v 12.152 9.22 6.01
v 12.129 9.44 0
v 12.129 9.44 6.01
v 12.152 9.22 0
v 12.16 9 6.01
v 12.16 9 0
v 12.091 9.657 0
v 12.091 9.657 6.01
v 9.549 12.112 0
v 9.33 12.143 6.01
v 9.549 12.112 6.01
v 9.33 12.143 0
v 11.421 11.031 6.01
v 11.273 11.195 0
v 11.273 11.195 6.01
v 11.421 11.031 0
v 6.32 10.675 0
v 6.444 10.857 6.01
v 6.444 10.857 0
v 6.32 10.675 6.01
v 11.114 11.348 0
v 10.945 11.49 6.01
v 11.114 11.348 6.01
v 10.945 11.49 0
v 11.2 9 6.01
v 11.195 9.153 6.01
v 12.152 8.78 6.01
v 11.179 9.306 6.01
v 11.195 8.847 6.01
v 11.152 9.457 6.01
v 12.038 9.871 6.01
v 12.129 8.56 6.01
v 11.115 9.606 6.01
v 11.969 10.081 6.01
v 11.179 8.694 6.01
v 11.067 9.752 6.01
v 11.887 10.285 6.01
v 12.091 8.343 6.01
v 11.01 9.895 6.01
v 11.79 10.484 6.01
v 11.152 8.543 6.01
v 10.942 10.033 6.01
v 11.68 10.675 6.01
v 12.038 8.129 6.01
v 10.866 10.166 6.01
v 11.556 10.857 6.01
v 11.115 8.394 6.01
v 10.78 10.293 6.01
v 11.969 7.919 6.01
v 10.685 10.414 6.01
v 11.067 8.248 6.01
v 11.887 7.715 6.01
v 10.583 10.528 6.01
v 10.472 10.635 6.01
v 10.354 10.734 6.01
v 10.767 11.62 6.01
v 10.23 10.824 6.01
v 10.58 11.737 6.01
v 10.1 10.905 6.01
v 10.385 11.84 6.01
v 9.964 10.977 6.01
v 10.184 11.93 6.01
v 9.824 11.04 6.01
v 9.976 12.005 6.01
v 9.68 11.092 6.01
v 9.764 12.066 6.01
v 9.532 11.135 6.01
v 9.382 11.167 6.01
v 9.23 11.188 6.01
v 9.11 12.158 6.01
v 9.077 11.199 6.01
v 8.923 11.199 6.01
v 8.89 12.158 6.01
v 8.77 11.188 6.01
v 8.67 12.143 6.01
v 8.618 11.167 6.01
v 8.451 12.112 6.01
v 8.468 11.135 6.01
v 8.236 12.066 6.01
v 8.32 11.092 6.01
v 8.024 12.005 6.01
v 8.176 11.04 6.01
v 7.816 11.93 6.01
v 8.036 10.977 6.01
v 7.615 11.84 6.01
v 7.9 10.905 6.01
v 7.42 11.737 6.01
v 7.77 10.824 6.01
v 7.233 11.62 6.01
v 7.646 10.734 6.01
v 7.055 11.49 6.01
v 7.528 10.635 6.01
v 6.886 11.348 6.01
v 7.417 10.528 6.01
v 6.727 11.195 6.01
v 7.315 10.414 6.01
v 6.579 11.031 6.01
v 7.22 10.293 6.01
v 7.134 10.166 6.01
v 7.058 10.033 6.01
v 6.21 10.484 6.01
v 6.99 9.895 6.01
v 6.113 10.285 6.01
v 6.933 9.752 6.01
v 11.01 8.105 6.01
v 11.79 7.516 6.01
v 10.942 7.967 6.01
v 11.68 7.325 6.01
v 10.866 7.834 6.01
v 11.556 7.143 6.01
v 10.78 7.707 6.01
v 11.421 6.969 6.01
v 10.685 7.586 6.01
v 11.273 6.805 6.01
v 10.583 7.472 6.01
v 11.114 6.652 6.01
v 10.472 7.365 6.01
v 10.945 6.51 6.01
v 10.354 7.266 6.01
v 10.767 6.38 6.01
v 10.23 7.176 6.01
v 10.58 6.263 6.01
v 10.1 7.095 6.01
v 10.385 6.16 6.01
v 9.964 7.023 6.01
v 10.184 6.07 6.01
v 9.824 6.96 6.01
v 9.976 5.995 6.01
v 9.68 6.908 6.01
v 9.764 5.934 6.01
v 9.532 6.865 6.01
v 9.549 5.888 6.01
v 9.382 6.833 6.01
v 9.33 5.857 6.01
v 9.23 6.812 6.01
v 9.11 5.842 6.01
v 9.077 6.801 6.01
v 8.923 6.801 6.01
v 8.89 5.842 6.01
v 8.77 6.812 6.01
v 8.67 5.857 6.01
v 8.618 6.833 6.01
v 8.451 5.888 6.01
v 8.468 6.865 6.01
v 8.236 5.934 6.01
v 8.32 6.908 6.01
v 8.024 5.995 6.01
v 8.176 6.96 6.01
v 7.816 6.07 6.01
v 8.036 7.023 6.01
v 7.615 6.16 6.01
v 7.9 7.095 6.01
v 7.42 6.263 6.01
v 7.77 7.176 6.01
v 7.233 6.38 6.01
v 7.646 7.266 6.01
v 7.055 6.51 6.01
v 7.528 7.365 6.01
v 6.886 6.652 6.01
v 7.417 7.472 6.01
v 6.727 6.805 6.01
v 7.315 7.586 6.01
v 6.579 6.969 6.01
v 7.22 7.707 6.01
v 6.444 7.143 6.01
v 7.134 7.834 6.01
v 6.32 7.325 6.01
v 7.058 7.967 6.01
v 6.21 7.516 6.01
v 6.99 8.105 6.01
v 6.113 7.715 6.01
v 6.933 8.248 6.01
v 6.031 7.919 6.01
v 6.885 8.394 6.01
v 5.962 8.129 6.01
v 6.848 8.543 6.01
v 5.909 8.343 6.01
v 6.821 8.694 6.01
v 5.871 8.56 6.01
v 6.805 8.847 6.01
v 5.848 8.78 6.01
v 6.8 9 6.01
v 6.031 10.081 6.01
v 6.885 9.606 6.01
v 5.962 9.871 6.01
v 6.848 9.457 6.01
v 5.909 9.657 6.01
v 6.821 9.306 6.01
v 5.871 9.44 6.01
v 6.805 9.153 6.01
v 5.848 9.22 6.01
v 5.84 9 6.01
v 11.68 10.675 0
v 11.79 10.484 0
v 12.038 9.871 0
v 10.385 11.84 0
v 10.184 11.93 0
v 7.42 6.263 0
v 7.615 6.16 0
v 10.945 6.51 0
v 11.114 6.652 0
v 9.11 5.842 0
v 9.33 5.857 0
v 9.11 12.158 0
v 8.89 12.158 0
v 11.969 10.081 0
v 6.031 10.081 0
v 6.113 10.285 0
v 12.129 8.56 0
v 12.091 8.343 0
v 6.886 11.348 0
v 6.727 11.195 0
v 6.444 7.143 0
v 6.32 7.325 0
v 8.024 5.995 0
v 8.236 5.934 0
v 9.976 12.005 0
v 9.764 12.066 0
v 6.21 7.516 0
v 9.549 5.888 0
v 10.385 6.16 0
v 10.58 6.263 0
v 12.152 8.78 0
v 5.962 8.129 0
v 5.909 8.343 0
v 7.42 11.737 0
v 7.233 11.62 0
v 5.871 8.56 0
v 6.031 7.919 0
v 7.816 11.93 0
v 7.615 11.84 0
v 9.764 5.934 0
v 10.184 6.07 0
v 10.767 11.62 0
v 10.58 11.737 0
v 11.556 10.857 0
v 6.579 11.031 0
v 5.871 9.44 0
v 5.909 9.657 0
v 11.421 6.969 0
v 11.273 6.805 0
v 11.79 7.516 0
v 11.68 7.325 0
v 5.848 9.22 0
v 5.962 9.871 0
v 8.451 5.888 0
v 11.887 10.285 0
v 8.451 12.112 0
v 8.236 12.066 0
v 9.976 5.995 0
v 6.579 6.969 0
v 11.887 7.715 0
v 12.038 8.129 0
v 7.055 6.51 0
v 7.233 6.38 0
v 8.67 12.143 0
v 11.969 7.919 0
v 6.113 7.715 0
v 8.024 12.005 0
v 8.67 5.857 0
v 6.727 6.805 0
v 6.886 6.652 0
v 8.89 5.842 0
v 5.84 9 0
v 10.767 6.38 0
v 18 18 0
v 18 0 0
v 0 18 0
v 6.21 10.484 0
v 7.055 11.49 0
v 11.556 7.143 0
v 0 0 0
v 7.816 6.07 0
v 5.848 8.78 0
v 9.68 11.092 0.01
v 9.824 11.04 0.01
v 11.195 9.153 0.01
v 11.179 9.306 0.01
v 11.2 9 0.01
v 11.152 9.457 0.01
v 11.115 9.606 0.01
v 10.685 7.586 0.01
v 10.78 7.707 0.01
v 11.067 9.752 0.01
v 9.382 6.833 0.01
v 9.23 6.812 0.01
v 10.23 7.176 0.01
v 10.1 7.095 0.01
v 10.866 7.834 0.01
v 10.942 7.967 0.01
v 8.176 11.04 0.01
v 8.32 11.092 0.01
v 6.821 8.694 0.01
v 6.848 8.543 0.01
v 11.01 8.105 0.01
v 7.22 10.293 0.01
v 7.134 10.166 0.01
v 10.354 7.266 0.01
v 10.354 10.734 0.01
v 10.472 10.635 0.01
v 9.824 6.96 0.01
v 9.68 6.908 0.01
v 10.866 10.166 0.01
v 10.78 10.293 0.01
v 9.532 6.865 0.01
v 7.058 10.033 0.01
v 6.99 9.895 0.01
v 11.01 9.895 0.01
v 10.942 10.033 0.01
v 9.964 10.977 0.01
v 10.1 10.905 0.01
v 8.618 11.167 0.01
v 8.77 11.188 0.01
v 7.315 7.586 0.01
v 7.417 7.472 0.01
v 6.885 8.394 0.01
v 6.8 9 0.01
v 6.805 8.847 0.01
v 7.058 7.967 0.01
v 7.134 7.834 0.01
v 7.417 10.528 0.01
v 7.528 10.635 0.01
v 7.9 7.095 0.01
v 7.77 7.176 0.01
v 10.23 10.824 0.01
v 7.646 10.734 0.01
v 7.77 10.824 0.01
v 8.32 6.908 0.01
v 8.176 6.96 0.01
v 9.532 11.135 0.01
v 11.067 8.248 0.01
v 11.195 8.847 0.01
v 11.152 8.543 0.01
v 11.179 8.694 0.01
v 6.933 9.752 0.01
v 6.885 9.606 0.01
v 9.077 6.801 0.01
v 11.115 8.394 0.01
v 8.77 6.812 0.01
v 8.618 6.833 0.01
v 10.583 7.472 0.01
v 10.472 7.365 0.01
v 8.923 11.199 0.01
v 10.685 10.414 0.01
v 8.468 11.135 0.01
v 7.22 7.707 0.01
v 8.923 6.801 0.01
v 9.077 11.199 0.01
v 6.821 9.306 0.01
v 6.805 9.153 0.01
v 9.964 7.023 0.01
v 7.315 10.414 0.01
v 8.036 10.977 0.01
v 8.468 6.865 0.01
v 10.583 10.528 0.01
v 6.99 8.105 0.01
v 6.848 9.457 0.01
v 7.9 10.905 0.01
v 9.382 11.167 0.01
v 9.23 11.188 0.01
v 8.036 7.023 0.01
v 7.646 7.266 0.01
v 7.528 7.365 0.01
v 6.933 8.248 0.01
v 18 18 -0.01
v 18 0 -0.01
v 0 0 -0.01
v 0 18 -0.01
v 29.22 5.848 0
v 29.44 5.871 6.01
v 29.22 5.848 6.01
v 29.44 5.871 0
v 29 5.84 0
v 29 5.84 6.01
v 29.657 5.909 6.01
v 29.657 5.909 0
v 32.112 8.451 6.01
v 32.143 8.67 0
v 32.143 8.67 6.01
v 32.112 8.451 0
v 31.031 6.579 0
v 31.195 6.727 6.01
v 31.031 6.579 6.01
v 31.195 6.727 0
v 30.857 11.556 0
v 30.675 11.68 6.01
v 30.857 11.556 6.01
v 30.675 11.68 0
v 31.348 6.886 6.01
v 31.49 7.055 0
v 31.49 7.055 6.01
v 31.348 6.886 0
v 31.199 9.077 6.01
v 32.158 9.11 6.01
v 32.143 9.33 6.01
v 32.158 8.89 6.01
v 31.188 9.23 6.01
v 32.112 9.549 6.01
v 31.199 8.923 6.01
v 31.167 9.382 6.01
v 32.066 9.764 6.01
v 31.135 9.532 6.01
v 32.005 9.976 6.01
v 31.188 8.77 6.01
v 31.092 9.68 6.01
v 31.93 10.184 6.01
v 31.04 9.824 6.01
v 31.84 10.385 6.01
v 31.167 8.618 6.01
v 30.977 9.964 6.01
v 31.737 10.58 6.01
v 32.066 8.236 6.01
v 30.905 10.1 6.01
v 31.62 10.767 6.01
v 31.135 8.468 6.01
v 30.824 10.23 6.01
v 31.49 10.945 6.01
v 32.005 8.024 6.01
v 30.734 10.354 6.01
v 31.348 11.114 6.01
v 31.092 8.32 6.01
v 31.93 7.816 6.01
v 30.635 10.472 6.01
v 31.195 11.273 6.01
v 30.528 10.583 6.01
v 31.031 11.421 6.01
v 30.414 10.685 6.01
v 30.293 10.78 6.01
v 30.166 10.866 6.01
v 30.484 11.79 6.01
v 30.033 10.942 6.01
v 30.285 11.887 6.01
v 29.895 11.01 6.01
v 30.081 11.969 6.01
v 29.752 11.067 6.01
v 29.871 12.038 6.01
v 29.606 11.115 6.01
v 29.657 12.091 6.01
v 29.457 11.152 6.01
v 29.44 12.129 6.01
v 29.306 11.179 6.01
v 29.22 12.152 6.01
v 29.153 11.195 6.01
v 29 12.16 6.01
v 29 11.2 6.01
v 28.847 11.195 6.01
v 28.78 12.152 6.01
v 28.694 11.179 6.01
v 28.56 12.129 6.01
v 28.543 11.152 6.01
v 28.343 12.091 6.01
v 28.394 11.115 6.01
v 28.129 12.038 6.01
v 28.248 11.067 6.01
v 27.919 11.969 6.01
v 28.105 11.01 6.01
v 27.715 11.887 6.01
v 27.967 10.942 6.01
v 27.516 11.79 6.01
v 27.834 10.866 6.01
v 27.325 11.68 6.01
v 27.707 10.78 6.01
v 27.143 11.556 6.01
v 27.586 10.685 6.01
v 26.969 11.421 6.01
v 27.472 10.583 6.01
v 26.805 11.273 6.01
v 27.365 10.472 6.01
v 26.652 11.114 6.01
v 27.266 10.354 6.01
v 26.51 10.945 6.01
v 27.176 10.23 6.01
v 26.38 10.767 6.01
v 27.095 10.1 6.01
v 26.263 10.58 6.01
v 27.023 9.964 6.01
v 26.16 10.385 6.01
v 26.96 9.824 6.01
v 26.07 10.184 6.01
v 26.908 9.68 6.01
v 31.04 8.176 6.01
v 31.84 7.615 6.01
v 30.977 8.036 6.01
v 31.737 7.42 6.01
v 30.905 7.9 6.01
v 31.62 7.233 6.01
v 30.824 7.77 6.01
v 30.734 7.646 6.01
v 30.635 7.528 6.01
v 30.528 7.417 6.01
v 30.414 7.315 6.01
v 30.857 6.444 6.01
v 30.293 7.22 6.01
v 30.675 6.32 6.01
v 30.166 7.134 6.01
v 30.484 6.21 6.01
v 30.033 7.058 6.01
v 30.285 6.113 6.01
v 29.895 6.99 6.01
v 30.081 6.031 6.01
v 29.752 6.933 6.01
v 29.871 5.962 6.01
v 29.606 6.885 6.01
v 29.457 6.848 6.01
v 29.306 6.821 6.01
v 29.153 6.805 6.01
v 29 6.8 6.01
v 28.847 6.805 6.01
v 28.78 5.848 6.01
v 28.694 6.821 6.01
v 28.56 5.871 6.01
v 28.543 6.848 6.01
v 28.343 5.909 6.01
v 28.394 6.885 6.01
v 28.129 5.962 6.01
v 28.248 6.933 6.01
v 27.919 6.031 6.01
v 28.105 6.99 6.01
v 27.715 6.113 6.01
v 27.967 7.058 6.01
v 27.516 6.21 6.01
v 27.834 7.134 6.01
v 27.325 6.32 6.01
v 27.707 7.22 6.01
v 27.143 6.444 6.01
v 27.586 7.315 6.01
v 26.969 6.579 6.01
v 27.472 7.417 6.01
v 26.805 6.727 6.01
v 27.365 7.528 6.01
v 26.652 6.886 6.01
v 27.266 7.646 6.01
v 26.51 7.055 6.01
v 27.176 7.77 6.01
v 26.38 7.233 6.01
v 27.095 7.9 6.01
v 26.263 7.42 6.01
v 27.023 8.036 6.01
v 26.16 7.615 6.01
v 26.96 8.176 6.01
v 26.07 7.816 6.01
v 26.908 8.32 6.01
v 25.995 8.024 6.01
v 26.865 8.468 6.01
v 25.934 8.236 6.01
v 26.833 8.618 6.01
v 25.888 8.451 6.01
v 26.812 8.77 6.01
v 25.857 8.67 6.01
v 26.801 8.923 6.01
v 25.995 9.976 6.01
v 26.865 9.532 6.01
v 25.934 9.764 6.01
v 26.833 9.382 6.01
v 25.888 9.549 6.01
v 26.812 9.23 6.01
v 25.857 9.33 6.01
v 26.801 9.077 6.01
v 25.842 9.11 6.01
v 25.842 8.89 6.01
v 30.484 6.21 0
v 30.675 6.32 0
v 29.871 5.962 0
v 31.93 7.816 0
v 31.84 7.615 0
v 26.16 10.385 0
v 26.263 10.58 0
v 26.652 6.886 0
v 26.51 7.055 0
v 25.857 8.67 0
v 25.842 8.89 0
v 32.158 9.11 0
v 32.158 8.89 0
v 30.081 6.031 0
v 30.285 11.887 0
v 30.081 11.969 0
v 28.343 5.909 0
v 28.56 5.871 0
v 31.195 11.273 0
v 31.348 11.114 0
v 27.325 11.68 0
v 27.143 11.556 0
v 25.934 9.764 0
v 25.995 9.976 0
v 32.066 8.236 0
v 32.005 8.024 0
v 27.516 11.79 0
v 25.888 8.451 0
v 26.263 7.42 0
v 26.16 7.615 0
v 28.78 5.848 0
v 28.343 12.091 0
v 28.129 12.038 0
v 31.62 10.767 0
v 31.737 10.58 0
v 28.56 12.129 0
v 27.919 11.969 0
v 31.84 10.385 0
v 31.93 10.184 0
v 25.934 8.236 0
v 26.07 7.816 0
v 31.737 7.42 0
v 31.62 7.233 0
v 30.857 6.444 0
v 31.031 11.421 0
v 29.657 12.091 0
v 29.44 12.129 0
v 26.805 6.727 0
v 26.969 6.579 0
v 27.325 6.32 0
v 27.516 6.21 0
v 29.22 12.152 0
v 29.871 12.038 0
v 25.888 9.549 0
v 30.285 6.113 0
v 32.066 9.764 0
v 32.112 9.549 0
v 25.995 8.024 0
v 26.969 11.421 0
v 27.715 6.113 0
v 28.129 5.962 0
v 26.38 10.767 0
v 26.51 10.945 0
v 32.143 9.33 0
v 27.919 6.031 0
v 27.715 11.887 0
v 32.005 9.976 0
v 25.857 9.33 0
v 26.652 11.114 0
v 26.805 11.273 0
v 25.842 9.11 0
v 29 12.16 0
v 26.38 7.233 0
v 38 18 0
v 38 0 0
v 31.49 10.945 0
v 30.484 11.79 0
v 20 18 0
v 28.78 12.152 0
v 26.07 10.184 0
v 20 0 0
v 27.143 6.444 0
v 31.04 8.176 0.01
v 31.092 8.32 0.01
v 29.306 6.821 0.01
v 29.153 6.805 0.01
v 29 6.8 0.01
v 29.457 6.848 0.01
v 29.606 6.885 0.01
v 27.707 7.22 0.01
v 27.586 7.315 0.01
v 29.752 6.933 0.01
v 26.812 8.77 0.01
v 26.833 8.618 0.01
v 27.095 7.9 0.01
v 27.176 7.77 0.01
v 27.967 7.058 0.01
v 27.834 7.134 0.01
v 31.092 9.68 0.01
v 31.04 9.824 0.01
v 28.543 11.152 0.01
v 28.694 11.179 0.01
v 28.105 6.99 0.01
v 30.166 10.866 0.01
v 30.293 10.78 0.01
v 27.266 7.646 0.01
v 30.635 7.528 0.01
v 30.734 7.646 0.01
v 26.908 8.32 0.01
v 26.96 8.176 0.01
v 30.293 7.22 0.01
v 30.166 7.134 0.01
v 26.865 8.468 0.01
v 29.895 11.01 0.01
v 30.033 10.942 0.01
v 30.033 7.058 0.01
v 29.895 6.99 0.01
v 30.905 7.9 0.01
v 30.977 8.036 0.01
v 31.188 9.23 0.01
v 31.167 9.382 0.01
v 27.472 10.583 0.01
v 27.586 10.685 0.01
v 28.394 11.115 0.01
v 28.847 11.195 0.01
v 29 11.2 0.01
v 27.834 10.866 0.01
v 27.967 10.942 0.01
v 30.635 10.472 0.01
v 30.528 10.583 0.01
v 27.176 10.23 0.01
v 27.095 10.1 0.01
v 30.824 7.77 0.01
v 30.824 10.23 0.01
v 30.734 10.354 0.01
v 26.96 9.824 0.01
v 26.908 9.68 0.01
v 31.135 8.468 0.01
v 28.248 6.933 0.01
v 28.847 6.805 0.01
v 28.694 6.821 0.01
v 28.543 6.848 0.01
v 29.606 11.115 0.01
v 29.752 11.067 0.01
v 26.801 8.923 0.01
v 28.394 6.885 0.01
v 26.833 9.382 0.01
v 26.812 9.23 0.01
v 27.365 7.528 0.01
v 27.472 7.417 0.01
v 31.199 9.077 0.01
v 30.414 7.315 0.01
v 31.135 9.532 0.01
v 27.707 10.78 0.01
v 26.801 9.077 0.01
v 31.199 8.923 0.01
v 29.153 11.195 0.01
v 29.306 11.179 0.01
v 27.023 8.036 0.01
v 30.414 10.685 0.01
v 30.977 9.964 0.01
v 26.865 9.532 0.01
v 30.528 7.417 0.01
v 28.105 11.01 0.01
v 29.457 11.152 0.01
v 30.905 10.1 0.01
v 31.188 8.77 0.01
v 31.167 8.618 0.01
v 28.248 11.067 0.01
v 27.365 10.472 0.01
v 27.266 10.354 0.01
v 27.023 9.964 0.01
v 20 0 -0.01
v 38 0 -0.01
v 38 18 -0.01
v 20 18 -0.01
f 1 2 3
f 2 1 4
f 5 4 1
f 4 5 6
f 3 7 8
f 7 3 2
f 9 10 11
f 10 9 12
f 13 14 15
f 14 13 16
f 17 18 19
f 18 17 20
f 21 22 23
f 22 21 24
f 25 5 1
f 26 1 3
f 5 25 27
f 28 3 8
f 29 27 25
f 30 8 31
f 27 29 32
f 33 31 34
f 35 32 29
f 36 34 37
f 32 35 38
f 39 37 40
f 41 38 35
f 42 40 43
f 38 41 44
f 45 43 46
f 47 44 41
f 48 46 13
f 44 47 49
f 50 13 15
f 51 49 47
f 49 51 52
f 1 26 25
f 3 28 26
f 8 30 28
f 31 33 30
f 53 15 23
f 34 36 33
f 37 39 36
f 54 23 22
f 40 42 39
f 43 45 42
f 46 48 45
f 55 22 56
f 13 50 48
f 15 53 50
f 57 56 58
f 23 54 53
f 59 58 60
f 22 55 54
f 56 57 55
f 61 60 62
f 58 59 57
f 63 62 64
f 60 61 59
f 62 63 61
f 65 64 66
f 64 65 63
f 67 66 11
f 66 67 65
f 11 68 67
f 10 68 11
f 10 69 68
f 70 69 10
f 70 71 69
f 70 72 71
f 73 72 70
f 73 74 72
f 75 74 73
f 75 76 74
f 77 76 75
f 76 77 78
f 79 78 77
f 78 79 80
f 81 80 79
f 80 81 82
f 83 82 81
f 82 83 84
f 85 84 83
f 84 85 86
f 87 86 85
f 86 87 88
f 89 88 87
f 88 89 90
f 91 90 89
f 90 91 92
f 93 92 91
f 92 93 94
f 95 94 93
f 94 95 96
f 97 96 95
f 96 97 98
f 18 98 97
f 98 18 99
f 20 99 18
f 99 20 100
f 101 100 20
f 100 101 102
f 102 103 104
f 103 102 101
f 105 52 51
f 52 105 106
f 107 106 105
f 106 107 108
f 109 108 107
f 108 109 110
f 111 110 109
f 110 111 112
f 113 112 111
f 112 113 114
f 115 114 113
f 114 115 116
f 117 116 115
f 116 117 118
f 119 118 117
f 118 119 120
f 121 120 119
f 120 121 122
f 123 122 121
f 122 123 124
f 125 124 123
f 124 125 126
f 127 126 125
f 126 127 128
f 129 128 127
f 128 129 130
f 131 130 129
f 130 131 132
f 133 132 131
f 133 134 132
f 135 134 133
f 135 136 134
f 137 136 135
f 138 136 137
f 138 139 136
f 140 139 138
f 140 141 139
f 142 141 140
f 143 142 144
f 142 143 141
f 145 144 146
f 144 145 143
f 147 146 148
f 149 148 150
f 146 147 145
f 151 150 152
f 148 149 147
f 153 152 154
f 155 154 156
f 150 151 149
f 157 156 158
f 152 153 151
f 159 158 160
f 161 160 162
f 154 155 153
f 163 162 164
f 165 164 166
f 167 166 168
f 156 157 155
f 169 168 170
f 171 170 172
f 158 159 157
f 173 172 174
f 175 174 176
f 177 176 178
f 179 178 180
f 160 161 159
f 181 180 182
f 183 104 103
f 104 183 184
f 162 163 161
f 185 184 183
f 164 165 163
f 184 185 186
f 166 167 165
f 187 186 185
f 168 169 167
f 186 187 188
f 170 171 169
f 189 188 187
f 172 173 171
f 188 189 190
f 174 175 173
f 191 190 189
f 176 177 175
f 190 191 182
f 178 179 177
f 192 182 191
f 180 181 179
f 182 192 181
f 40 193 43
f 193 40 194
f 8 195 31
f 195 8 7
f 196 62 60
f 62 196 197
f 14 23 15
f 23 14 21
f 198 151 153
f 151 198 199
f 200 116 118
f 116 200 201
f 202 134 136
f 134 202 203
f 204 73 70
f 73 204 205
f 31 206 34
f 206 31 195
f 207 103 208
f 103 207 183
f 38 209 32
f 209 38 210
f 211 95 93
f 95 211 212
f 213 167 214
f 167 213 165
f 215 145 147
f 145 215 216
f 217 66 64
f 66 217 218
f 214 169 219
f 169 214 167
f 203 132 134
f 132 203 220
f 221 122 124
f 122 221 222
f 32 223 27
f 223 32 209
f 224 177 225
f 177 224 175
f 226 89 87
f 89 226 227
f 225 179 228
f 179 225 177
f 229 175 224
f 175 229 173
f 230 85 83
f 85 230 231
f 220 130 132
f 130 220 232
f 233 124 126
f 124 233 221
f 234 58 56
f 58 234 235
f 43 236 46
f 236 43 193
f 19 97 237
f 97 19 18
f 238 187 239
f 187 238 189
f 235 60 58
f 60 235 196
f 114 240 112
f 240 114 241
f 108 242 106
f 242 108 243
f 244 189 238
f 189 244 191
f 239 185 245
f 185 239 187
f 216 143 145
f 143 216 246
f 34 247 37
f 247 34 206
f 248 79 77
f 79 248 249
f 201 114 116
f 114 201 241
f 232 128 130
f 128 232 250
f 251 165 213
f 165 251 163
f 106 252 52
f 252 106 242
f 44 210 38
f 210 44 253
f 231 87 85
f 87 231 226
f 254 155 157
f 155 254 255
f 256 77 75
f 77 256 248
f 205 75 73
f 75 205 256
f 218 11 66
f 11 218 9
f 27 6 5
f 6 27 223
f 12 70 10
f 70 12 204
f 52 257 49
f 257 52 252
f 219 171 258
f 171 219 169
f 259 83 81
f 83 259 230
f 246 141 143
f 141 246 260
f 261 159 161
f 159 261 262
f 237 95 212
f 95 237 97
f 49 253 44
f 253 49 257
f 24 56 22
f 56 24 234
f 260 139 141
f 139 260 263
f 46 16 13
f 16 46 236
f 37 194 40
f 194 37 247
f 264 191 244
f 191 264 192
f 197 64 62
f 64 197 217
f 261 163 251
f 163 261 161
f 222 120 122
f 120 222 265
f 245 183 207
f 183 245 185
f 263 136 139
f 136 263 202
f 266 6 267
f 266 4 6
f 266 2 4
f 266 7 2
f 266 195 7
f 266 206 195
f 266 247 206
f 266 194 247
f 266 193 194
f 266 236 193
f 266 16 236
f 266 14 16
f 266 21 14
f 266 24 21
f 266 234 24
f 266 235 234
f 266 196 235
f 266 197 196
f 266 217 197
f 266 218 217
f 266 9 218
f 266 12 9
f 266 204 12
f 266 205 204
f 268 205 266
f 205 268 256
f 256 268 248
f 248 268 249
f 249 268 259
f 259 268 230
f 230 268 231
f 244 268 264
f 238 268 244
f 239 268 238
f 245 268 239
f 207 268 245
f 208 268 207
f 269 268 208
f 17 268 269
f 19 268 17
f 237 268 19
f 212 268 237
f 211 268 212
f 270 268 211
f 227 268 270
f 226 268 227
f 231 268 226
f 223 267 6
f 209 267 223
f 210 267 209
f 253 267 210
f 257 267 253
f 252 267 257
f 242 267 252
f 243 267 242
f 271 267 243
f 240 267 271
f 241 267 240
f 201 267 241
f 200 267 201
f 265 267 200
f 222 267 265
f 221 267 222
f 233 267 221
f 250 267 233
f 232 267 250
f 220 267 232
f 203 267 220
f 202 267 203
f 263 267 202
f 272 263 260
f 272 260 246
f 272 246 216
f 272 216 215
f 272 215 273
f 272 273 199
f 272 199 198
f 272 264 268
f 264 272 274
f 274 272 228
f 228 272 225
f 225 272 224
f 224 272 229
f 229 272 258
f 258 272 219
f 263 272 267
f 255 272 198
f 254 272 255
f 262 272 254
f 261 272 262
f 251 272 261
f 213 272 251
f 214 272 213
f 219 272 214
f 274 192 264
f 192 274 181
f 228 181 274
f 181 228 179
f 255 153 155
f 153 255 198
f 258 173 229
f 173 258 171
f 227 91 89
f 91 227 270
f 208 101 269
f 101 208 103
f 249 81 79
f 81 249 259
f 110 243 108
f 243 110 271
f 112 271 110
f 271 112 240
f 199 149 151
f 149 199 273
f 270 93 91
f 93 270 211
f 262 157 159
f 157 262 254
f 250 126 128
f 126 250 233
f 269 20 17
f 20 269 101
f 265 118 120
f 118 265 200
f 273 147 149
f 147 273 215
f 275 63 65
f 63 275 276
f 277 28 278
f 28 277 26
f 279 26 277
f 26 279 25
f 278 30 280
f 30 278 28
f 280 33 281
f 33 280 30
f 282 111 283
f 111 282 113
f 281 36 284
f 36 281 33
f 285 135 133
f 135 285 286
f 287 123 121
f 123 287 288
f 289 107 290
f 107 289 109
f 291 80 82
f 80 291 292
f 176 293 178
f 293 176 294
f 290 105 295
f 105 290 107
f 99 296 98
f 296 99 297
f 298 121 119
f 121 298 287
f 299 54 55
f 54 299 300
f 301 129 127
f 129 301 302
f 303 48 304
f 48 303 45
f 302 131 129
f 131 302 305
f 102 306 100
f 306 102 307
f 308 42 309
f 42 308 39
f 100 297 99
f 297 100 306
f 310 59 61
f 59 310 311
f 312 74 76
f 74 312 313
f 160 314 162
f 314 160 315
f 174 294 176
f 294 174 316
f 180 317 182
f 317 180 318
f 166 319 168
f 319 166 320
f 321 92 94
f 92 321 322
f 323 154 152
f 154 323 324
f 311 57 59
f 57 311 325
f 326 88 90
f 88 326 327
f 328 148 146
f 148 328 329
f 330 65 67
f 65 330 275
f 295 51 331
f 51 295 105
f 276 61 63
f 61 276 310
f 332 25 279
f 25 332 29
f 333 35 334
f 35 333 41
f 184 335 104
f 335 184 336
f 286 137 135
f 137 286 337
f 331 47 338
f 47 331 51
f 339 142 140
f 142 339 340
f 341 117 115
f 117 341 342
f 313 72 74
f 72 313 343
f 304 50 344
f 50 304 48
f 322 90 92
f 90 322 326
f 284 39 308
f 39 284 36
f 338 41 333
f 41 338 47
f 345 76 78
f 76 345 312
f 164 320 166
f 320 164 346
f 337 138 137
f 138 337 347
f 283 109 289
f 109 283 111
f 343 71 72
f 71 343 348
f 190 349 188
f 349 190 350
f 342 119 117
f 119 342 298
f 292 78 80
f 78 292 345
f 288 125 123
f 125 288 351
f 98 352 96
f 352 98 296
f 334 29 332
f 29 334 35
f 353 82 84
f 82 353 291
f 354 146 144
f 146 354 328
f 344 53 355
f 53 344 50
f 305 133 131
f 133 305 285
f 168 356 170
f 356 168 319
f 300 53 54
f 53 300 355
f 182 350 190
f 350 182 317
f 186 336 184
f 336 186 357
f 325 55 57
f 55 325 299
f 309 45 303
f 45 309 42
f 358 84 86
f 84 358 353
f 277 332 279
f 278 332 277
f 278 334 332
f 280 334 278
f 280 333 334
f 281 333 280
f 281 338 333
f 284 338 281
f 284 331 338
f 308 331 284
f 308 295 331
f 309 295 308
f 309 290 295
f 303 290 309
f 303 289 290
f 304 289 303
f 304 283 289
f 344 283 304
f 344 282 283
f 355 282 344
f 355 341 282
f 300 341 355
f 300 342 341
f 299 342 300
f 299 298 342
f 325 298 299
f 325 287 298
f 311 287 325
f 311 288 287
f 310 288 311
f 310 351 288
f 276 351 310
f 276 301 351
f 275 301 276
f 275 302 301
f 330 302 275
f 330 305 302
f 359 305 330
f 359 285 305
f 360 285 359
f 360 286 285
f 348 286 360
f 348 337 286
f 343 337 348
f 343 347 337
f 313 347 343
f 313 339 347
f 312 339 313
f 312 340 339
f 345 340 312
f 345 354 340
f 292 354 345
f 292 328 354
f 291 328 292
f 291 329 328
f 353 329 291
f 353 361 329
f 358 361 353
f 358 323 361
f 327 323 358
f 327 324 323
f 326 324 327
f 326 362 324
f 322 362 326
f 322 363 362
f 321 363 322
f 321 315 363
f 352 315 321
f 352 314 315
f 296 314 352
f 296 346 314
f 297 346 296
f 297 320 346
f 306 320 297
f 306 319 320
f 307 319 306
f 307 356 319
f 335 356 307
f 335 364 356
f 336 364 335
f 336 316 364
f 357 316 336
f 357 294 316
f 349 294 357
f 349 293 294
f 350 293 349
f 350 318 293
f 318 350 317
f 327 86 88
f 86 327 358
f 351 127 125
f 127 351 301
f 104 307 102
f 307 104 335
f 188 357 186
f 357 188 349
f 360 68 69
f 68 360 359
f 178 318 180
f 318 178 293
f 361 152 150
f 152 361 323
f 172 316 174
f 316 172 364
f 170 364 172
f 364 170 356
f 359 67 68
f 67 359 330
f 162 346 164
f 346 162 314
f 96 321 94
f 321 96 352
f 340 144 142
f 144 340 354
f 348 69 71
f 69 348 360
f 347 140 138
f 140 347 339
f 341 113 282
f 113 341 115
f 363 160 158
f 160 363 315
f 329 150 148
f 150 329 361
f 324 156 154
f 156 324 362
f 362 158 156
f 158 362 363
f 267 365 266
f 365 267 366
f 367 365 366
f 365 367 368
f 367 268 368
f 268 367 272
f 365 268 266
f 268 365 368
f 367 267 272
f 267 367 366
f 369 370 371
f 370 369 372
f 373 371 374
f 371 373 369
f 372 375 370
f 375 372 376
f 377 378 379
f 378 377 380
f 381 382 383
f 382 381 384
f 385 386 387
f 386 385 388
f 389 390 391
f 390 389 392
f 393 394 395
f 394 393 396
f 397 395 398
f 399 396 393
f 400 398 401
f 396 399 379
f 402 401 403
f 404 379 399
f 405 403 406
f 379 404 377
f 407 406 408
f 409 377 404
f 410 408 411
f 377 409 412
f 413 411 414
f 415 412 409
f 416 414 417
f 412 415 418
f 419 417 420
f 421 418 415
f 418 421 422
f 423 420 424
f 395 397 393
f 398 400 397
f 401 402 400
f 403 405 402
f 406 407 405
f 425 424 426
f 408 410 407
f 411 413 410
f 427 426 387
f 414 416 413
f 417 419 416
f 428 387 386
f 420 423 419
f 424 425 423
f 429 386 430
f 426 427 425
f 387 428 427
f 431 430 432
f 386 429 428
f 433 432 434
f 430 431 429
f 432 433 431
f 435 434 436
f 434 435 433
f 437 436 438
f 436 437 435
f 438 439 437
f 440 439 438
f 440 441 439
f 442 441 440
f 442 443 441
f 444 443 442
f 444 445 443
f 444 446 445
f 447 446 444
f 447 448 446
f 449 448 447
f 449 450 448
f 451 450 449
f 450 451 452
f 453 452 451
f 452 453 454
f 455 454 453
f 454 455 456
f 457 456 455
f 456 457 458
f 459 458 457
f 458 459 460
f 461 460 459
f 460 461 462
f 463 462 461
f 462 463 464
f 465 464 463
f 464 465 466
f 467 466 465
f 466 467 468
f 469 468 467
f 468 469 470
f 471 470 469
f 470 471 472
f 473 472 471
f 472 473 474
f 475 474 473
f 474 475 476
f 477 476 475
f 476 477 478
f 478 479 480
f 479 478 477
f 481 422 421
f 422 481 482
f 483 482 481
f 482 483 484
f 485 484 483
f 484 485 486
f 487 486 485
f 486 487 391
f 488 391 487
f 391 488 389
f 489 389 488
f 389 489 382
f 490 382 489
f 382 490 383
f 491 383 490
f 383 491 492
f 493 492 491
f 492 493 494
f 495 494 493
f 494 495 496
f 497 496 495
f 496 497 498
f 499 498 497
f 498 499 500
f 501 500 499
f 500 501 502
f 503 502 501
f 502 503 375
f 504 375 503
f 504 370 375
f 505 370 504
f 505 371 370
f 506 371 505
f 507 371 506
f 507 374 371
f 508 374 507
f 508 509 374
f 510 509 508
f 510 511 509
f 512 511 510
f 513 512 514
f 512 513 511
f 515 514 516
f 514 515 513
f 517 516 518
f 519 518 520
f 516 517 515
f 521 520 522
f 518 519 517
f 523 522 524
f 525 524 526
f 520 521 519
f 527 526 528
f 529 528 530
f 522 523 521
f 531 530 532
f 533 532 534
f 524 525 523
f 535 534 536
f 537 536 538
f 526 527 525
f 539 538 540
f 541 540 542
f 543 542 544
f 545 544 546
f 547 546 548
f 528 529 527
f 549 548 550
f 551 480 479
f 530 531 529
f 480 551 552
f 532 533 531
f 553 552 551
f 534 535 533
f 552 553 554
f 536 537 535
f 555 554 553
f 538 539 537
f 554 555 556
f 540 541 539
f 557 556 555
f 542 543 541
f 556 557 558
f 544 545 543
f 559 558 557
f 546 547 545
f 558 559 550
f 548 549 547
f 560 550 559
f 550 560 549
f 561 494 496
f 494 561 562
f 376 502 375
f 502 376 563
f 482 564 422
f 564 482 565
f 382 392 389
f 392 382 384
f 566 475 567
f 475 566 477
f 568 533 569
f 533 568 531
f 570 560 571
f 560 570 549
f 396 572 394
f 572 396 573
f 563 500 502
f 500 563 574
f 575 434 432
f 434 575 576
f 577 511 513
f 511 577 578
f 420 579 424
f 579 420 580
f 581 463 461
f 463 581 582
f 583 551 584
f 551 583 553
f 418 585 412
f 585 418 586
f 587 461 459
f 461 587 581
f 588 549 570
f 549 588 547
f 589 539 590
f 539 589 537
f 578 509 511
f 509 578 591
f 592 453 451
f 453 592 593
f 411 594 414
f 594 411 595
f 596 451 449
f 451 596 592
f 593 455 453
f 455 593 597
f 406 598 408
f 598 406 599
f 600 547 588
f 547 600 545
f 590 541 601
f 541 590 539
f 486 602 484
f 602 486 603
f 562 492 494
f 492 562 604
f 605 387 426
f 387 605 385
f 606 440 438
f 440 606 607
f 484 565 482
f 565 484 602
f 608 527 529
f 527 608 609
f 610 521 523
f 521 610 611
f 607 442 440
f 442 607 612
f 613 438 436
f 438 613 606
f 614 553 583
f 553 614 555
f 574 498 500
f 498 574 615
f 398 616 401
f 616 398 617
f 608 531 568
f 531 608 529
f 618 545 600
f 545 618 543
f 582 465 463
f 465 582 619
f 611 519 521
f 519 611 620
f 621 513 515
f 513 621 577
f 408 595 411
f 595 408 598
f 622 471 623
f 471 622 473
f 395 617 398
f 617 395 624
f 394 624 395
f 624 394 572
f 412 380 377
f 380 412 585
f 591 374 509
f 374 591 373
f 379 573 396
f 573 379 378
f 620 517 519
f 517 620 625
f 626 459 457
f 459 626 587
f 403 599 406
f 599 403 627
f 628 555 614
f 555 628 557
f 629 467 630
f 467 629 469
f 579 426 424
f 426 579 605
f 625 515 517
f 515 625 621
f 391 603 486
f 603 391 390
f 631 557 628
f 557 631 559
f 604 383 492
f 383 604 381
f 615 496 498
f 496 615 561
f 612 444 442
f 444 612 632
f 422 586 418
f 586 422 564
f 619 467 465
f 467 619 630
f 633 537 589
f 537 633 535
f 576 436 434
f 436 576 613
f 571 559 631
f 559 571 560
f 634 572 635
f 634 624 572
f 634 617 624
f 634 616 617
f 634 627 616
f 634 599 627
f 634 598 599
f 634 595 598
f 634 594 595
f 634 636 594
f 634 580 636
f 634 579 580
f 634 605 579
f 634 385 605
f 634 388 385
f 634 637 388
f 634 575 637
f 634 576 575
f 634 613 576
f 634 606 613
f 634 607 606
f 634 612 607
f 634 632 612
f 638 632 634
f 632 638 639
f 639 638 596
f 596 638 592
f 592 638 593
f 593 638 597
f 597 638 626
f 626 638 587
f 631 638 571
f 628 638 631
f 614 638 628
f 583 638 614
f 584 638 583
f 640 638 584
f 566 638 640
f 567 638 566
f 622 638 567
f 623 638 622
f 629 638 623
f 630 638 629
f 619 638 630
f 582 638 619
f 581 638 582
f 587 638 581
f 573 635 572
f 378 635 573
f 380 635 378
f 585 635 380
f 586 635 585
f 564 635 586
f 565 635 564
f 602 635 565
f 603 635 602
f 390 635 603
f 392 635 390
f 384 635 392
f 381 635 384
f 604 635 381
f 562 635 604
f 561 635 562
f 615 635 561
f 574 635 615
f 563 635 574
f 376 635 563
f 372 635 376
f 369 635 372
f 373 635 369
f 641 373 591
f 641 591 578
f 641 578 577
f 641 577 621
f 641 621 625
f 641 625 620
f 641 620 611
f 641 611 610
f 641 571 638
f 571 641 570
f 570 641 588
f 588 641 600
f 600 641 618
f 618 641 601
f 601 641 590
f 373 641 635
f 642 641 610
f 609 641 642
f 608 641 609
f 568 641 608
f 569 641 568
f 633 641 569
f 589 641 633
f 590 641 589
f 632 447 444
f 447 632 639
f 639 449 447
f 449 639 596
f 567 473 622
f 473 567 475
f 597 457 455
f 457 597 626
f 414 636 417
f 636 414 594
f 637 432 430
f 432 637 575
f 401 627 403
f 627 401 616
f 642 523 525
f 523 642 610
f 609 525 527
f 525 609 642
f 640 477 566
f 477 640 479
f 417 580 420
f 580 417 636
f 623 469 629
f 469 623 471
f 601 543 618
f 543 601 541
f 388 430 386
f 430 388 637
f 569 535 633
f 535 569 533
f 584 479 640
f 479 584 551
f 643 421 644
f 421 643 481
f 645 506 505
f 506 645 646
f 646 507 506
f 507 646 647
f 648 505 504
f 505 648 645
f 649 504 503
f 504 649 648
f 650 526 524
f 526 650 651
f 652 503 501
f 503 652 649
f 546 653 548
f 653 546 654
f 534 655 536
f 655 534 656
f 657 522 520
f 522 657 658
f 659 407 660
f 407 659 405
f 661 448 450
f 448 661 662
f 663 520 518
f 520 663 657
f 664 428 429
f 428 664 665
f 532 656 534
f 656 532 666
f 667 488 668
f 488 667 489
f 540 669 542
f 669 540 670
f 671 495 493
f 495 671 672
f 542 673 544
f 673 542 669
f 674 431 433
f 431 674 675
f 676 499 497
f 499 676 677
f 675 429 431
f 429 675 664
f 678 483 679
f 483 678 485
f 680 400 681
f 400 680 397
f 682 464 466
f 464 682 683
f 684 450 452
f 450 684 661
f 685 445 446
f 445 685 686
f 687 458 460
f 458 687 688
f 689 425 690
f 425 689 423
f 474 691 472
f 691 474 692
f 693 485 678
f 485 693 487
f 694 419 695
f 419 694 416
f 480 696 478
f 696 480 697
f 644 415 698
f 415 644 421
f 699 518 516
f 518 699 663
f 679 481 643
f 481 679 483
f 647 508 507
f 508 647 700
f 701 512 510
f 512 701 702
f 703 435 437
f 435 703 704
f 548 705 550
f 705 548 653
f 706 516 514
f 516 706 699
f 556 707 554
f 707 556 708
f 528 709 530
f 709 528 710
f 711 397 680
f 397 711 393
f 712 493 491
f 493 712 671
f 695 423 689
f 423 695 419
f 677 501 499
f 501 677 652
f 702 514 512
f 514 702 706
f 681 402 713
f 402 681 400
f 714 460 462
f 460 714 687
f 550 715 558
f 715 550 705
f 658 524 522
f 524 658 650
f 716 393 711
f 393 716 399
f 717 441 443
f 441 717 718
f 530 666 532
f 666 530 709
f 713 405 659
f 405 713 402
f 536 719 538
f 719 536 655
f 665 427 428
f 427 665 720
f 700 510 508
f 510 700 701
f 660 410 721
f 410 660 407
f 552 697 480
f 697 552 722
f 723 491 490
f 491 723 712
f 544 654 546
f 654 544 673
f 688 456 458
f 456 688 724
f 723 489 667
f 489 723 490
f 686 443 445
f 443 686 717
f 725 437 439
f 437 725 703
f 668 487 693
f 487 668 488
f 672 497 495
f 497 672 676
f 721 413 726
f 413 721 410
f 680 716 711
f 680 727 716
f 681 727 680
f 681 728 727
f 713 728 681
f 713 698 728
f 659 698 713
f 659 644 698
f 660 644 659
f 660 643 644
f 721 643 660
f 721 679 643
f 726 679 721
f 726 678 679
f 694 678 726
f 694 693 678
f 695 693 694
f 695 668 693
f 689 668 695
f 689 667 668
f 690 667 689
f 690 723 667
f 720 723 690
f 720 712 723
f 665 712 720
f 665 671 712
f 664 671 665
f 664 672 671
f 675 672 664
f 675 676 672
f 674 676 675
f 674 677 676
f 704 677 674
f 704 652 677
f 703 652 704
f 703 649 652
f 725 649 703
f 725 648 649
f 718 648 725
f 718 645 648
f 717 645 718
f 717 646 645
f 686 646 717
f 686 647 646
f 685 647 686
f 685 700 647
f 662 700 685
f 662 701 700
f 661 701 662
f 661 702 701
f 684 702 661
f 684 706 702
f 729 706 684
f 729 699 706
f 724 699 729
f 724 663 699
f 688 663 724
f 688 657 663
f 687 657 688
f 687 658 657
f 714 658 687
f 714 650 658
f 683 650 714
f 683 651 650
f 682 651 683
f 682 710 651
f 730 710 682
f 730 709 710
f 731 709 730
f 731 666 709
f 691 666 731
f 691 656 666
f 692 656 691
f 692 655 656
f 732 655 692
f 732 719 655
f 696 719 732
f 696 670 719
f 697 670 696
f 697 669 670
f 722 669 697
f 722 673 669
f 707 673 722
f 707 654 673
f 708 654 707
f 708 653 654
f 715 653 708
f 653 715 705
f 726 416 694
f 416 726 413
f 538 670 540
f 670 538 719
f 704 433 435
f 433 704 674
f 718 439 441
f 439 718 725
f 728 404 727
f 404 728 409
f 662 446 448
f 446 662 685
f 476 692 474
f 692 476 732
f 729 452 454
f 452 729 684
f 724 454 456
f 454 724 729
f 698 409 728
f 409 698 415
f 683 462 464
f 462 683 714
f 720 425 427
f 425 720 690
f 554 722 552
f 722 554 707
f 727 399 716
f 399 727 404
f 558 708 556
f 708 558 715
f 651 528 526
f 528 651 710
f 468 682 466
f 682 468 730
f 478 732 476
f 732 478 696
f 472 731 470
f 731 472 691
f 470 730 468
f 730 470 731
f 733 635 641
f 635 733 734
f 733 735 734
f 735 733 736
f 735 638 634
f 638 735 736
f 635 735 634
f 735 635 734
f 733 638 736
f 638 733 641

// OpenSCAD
// file: ../../Base/Boxes.scad
// Fischertechnik Box Foundation
// Pre-designed Boxes

use <Constants.scad>

include <PlacementOptions.scad>

box190Width = 190;
box190Depth = 130;
box130Width = 130;
box130Depth = 95;

// Values are from an original ec3 box
topBottomDifference = 1.5;
outerHeight = 40;
innerHeight = 38.2;
baseThickness = outerHeight - innerHeight;
stackExcess = 5.7;
radius = 3.5;
wallThickness = 1.5;
tolerance = 0.2;
stackOffset = innerHeight - stackExcess;

boxUsageHeight = stackOffset;
boxWallThickness = wallThickness;
boxBaseThickness = baseThickness;
boxWebWidth = 3.0;

// getBoxWallThickness()
// Gets the wall thickness of a Fischertechnik Box
function getBoxWallThickness() = boxWallThickness;

// getBoxUsageHeight()
// Gets the usable height of a Fischertechnik box
function getBoxUsageHeight() = boxUsageHeight;

// getBoxInnerHeight()
// Gets the inner height of a Fischertechnik box, including the stack excess
function getBoxInnerHeight() = innerHeight;

// getBoxBaseThickness()
// Gets the thickness of the Fischertechnik box base.
function getBoxBaseThickness() = boxBaseThickness;

// getBoxWebWidth()
// Gets the width of a box web
function getBoxWebWidth() = boxWebWidth;

// getBox190Space()
// Gets the usable inner space of a Box 190 as an x/y-list
function getBox190Space() = [
    box190Width - 2*getBoxWallThickness() - topBottomDifference, 
    box190Depth - 2*getBoxWallThickness() - topBottomDifference ];

// BoxBase(width, depth)
// Creates an empty stackable Fischertechnik compatible box
// width = Outer width of the box (190, 130, ...)
// depth = Outer depth of the box (130, 95, ...)

module BoxBase(width, depth, height=outerHeight) {    
    thinPlate = 0.01;

    innerHeight = height - baseThickness;    
    
    module BodyPlate(width, depth) {
        translate([radius, radius])
        hull() {
            w = width-2*radius;
            d = depth-2*radius;
            cube([w, d, thinPlate]);
            cylinder(thinPlate, r=radius, $fn=getFragments());
            translate([w, 0])
                cylinder(thinPlate, r=radius, $fn=getFragments());
            translate([w, d])
                cylinder(thinPlate, r=radius, $fn=getFragments());
            translate([0, d])
                cylinder(thinPlate, r=radius, $fn=getFragments());
        }
    }
    
    module Body(tolerance=tolerance) {
        hull() {
            // Bottom with tolerance to fit into the original boxes when stacked
            translate([-wallThickness+tolerance, -wallThickness+tolerance, -baseThickness])
                BodyPlate(width-topBottomDifference-2*tolerance, depth-topBottomDifference-2*tolerance);
            
            // Top
            translate([-wallThickness-topBottomDifference/2, -wallThickness-topBottomDifference/2, innerHeight-thinPlate])
                BodyPlate(width, depth);
         }
    }

    module Cutoff() {
        hull() {
            coWidth = width - 2*wallThickness;
            coDepth = depth - 2*wallThickness;
            
            // Bottom
            BodyPlate(coWidth-topBottomDifference, coDepth-topBottomDifference);

            // Top
            translate([-topBottomDifference/2, -topBottomDifference/2, innerHeight+thinPlate]) 
                BodyPlate(coWidth, coDepth);
        }
    }
    
    difference() {        
        Body();
        Cutoff();
        stackOffset = innerHeight - stackExcess;
        translate([0, 0, stackOffset + baseThickness])
            Body(tolerance=0);
    }
}

// Creates the Fischertechnik empty box 130x190 mm and places it at position 0,0
// 190x130 are the outer sizes, the inner space is slightly smaller. Use getBox190Space() to get the inner sizes.
// The box is positioned that the usable inner space is at the 0,0,0 position. The

module Box190() {
    BoxBase(box190Width, box190Depth);
}

// Gets the usable inner space of a Box 130 as an x/y-list
function getBox130Space() = [
    box130Width - 2*getBoxWallThickness(), 
    box130Depth - 2*getBoxWallThickness() ];

// Creates the Fischertechnik empty box 95x130 mm and places it at position 0,0
// 190x130 are the outer sizes, the inner space is slightly smaller. Use getBox190Space() to get the inner sizes.
// The box is positioned that the usable inner space is at the 0,0,0 position. The

module Box130() {
    BoxBase(box130Width, box130Depth);
}

// Creates a web at the specified box walls
// corner 0 = LowerLeft, 1 = UpperLeft, 2 = UpperRight, 3 = LowerRight
// side 0 = LeftOfCorner, 1 = RightOfCorner
// distance = Distance in mm from the corner
// boxSpace = inner width and depth of the box (default: Box 190)
// webWidth = length of the web (default is 3 mms)
// webThickness = thickness of the web (default is 1 mm)

module BoxWeb(corner, side, distance, boxSpace=getBox190Space(), webWidth=getBoxWebWidth(), webThickness=1.0) {
    sink = getBoxWallThickness()/2;

    width = (corner % 2 == 0) ? 
            (side == LeftOfCorner ? webWidth : webThickness) :
            (side == LeftOfCorner ? webThickness : webWidth);

    depth = (corner % 2 == 0) ? 
            (side == RightOfCorner ? webWidth : webThickness) :
            (side == RightOfCorner ? webThickness : webWidth);
    
    xDiff = corner == LowerLeft ? 
                (side == LeftOfCorner ? -sink : distance) :
            (corner == UpperLeft ?                
                (side == LeftOfCorner ? distance : -sink) :
            (corner == UpperRight ?
                (side == LeftOfCorner ? boxSpace.x-webWidth+sink : boxSpace.x-distance-webThickness) :
                (side == LeftOfCorner ? boxSpace.x-distance-webThickness: boxSpace.x-webWidth+sink)));

    yDiff = corner == LowerLeft ? 
                (side == RightOfCorner ? -sink : distance) :
            (corner == UpperLeft ?
                (side == RightOfCorner ? boxSpace.y-distance : boxSpace.y-webWidth+sink) :
            (corner == UpperRight ?
                (side == RightOfCorner ? boxSpace.y-webWidth+sink : boxSpace.y-distance) :
                (side == RightOfCorner ? distance : -sink)));
    
    translate([xDiff, yDiff, -getExcess()])
        cube([width, depth, boxUsageHeight + 2*getExcess()]);
}
// file: ../../Base/Rotation.scad
// Fischertechnik Box Foundation
// Geometry Helpers Rotation

include <PlacementOptions.scad>

// getRotatedSpace(space, rotation=NoRotation)
// Rotates the space dependent on the specified rotation

function getRotatedSpace(space, rotation=NoRotation) = [
    (rotation == Rotate90 || rotation == Rotate270) ? space.y : space.x,
    (rotation == Rotate90 || rotation == Rotate270) ? space.x : space.y
];

// Rotates the given space around the fixed left lower corner
// space = the space the children needs as width/depth list [width,depth]
// rotation = 0 Rotate0 degrees, 1 Rotate90 degrees, 2 Rotate180 degrees, 3 Rotate270 degrees (equivalent to -90)

module RotateFix(space, rotation=NoRotation) {
    dy = (rotation == Rotate0 || rotation == Rotate270) ? 0 :
        (rotation == Rotate90) ? space.x :
        space.y;
    dx = (rotation < Rotate180) ? 0 :
        (rotation == Rotate180) ? space.x :
        space.y;
    
    translate([dx, dy, 0])
        rotate([0, 0, rotations[rotation]])
            children();
}
// file: ../../Base/Alignment.scad
// Fischertechnik Box Foundation
// Geometry Helpers Alignment

include <PlacementOptions.scad>

// getAlignedX(elementWidth, spaceWidth, align=AlignRight, offset=0)
// Gets the aligned X offset of an element with the given
// width in the given space.
// elementWidth = The width of the element to positon
// spaceWidth = The space where the element should be aligned
// align = 0 AlignLeft, 1 AlignCenter, 2 AlignRight
// offset = an optional offset from the aligned position. When
// aligned left or centered, then positive values are in X direction.
// When aligned right then positive values are in negative X direction.

function getAlignedX(elementWidth, spaceWidth, align=AlignRight, offset=0) =
    (align == AlignLeft) ?
        offset :
        ((align == AlignCenter) ?
        (spaceWidth - elementWidth)/2 + offset :
        spaceWidth - offset - elementWidth);

// getAlignedY(elementDepth, spaceDepth, align=AlignTop, offset=0)
// Gets the aligned Y offset of an element with the given
// depth in the given space.
// elementDepth = The depth of the element to positon
// spaceDepth = The space where the element should be aligned
// align = 0 AlignBottom, 1 AlignCenter, 2 AlignTop
// offset = an optional offset from the aligned position. When
// aligned bottom or centered, then positive values are in Y direction.
// When aligned top then positive values are in negative Y direction.

function getAlignedY(elementDepth, spaceDepth, align=AlignTop, offset=0) =
    (align == AlignBottom) ?
        offset :
        ((align == AlignCenter) ?
        (spaceDepth - elementDepth)/2 + offset :
        spaceDepth - offset - elementDepth);
// file: ../../Base/Constants.scad
// Fischertechnik Box Foundation
// Constants

// Constant values necessary for multiple elements

// Base constants
dividerThickness = 1.2;
excess = 0.01;
fragments = 90;
tolerance = 0.8;

// Gets the thickness of a divider 
function getDividerThickness() = dividerThickness;

// Gets the excess that is used to merge walls into each other
function getExcess() = excess;

// Gets amount of fragments of a cylinder
function getFragments() = fragments;

// Gets the inner tolerance of a frame to each side
function getTolerance() = tolerance;


// Fischertechnik specific constants
axisDiameter = 4;
axisBottomDiameter = axisDiameter + 1;
standardEdgeDistance = 2.5;
standardWebDistance = 11.5;
standardCornerLength = 15;
tubeWallFactor = 0.8;
smallPartsFrameHeight = 20;

// Gets axis diameter
function getAxisDiameter() = axisDiameter;

// Gets axis bottom diameter for thicker part at the bottom
function getAxisBottomDiameter() = axisBottomDiameter;

// gets the standard distance to the wall of the box for dockable frames with webs
function getStandardEdgeDistance() = standardEdgeDistance;

// gets the standard distance of each web to the corner of the dockable frame
function getStandardWebDistance() = standardWebDistance;

// gets the standard length of the corner walls of a dockable frame
function getStandardCornerLength() = standardCornerLength;

// gets the wall thickness of a tube.
function getTubeWallThickness() = tubeWallFactor * getDividerThickness();

// gets the frame height for docked small parts boxes.
function getSmallPartsFrameHeight() = smallPartsFrameHeight;
// file: ../../Base/PlacementOptions.scad
// Fischertechnik Box Foundation
// Placement Options

// Alignment
NoAlign = 0;
AlignLeft = 1;
AlignBottom = 2;
AlignCenter = 3;
AlignRight = 4;
AlignTop = 5;

// Element rotation degree steps
rotations = [0, -90, -180, -270];

// Rotation
NoRotation = 0;
Rotate0 = 0;
Rotate90 = 1;
Rotate180 = 2;
Rotate270 = 3;

// Docking (seen from above)
NoDock = -1;
DockLeft = 0;
DockTop = 1;
DockRight = 2;
DockCorner = 2;
DockBottom = 3;

// Web corners
LowerLeft = 0;
UpperLeft = 1;
UpperRight = 2;
LowerRight = 3;

// Web position relative to corner
LeftOfCorner = 0;
RightOfCorner = 1;
// file: ../../Elements/CylinderStepUpDownCog.scad
// Fischertechnik Box Library
// Cylinder for standing step-up/step-down cog
// 31052

use <../Base/Constants.scad>
use <../Base/Placement.scad>
use <../ModelBase/Simple.scad>
use <../ModelBase/Complex.scad>

width = 18;
depth = 18;
height = 6;

// getCylinderStepUpDownCogSpace()
// Gets the space the cylinder for a step-up/step-down cog needs

function getCylinderStepUpDownCogSpace() = [width, depth, height];

// CylinderAxis30()
// Standing cylinder for a step-up/step-down cog (mot1)
// 31052

module CylinderStepUpDownCog() {
    Space(getCylinderStepUpDownCogSpace());
    
    Center(getCylinderStepUpDownCogSpace())
        Tube(height, innerDiameter=getFrameAxisDepth());
}

// Tests
color("lightgray")
CylinderStepUpDownCog();
// file: ../../Base/Placement.scad
// Fischertechnik Box Foundation
// Geometry Helpers Placement

use <Constants.scad>
use <Alignment.scad>
use <Rotation.scad>
use <Boxes.scad>

include <PlacementOptions.scad>

// Place(x=0, y=0, elementSpace=[0,0], alignX=AlignLeft, alignY=AlignBottom, rotation=Rotate0, boxSpace=getBox190Space())
// Places the child at the specified position
// y = Y-Position. This is a relative position when an X aligment is specified.
// x = X-Position. This is a relative position when an Y aligment is specified.
// elementSpace = space of the element to be placed [x,y]
// alignX = -1=NoAlign, 0 AlignLeft, 1 AlignCenter, 3 AlignRight (elementSpace and boxSpace required!)
// alignY = -1=NoAlign, 2 AlignBottom, 1 AlignCenter, 4 AlignTop (elementSpace and boxSpace required!)
// rotation = 0 Rotate0 0 degrees, 1 Rotate90 90 degrees, 
// 2 Rotate180 180 degrees, 3 Rotate270 270 degrees (equivalent to -90)
// boxSpace = Inner space of the box where the placement occurs [x,y] - default is Box 190x130 inner space

module Place(x=0, y=0, elementSpace=[0,0], 
  alignX=AlignLeft, alignY=AlignBottom, 
  rotation=NoRotation, boxSpace=getBox190Space()) {

    module Position(x, y, space, rotation=Rotate0) {
        translate([x, y, 0])
            RotateFix(space, rotation)
                children();
    }

    space = getRotatedSpace(elementSpace, rotation);
    alignedX = getAlignedX(space.x, boxSpace.x, alignX, x);
    alignedY = getAlignedY(space.y, boxSpace.y, alignY, y);
    Position(alignedX, alignedY, elementSpace, rotation)
        children();
}

// Center(space=getBox130Space(), elementSpace=[0,0])
// space = Space where the children is centered. For cylinder use centered=true and no elementSpace.
// elementSpace = space of the element to be centered [x,y]

module Center(space=getBox190Space(), elementSpace=[0,0]) {
    Place(elementSpace=elementSpace, boxSpace=space, alignX=AlignCenter, alignY=AlignCenter)
        children();
}

// CenterHorizontal(width=0, y=0, offset=0, space=getBox130Space())
// width = Width of the element to be placed.
// y = Y position of the element
// offset = Offset from the center position (negative will be left of the center)
// space = Space where the element is placed

module CenterHorizontal(width=0, y=0, offset=0, space=getBox190Space()) {
    Place(x=offset, y=y, elementSpace=[width, 0], boxSpace=space, alignX=AlignCenter)
        children(0);
}

// CenterVertical(depth=0, x=0, offset=0, space=getBox130Space())
// depth = Depth of the element to be placed.
// x = X position of the element
// offset = Offset from the center position (negative will be down of the center)
// space = Space where the element is placed

module CenterVertical(depth=0, x=0, offset=0, space=getBox190Space()) {
    Place(x=x, y=offset, elementSpace=[0, depth], boxSpace=space, alignY=AlignCenter)
        children(0);
}

// getIsVertical(align)
// True if the specified alignment needs a vertical orientation for a divider (AlignRight, AlignLeft)

function getIsVertical(align) = (align == AlignRight || align == AlignLeft);

// getIsHorizontal(align)
// True if the specified alignment needs a horizontal orientation for a divider (AlignTop, AlignBottom)

function getIsHorizontal(align) = (align == AlignTop || align == AlignBottom);
// main file
// Fischertechnik Box Foundation
// Elements
// Test CylinderStepUpDownCog

use <../../Base/Placement.scad>
use <../../Elements/CylinderStepUpDownCog.scad>

include <../../Base/PlacementOptions.scad>

CylinderStepUpDownCog();

Place(20, 0, getCylinderStepUpDownCogSpace(), rotation=Rotate90)
    CylinderStepUpDownCog();
